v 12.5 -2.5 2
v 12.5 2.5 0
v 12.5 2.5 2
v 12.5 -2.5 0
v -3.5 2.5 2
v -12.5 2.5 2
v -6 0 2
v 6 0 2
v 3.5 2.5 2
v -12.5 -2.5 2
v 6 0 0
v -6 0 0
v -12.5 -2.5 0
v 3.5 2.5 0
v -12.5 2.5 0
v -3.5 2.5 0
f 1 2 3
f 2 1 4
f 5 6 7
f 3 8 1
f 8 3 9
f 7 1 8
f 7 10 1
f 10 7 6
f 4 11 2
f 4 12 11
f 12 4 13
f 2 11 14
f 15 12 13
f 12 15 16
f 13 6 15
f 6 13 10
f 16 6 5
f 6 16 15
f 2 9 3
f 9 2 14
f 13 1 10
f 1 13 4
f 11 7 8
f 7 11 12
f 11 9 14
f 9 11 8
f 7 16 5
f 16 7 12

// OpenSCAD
difference() {
	translate(v = [0, 0, 1.0000000000]) {
		cube(center = true, size = [25, 5, 2]);
	}
	translate(v = [-6.0000000000, 0, 0]) {
		linear_extrude(height = 2) {
			polygon(points = [[0, 0], [12, 0], [6.0000000000, 6]]);
		}
	}
}
